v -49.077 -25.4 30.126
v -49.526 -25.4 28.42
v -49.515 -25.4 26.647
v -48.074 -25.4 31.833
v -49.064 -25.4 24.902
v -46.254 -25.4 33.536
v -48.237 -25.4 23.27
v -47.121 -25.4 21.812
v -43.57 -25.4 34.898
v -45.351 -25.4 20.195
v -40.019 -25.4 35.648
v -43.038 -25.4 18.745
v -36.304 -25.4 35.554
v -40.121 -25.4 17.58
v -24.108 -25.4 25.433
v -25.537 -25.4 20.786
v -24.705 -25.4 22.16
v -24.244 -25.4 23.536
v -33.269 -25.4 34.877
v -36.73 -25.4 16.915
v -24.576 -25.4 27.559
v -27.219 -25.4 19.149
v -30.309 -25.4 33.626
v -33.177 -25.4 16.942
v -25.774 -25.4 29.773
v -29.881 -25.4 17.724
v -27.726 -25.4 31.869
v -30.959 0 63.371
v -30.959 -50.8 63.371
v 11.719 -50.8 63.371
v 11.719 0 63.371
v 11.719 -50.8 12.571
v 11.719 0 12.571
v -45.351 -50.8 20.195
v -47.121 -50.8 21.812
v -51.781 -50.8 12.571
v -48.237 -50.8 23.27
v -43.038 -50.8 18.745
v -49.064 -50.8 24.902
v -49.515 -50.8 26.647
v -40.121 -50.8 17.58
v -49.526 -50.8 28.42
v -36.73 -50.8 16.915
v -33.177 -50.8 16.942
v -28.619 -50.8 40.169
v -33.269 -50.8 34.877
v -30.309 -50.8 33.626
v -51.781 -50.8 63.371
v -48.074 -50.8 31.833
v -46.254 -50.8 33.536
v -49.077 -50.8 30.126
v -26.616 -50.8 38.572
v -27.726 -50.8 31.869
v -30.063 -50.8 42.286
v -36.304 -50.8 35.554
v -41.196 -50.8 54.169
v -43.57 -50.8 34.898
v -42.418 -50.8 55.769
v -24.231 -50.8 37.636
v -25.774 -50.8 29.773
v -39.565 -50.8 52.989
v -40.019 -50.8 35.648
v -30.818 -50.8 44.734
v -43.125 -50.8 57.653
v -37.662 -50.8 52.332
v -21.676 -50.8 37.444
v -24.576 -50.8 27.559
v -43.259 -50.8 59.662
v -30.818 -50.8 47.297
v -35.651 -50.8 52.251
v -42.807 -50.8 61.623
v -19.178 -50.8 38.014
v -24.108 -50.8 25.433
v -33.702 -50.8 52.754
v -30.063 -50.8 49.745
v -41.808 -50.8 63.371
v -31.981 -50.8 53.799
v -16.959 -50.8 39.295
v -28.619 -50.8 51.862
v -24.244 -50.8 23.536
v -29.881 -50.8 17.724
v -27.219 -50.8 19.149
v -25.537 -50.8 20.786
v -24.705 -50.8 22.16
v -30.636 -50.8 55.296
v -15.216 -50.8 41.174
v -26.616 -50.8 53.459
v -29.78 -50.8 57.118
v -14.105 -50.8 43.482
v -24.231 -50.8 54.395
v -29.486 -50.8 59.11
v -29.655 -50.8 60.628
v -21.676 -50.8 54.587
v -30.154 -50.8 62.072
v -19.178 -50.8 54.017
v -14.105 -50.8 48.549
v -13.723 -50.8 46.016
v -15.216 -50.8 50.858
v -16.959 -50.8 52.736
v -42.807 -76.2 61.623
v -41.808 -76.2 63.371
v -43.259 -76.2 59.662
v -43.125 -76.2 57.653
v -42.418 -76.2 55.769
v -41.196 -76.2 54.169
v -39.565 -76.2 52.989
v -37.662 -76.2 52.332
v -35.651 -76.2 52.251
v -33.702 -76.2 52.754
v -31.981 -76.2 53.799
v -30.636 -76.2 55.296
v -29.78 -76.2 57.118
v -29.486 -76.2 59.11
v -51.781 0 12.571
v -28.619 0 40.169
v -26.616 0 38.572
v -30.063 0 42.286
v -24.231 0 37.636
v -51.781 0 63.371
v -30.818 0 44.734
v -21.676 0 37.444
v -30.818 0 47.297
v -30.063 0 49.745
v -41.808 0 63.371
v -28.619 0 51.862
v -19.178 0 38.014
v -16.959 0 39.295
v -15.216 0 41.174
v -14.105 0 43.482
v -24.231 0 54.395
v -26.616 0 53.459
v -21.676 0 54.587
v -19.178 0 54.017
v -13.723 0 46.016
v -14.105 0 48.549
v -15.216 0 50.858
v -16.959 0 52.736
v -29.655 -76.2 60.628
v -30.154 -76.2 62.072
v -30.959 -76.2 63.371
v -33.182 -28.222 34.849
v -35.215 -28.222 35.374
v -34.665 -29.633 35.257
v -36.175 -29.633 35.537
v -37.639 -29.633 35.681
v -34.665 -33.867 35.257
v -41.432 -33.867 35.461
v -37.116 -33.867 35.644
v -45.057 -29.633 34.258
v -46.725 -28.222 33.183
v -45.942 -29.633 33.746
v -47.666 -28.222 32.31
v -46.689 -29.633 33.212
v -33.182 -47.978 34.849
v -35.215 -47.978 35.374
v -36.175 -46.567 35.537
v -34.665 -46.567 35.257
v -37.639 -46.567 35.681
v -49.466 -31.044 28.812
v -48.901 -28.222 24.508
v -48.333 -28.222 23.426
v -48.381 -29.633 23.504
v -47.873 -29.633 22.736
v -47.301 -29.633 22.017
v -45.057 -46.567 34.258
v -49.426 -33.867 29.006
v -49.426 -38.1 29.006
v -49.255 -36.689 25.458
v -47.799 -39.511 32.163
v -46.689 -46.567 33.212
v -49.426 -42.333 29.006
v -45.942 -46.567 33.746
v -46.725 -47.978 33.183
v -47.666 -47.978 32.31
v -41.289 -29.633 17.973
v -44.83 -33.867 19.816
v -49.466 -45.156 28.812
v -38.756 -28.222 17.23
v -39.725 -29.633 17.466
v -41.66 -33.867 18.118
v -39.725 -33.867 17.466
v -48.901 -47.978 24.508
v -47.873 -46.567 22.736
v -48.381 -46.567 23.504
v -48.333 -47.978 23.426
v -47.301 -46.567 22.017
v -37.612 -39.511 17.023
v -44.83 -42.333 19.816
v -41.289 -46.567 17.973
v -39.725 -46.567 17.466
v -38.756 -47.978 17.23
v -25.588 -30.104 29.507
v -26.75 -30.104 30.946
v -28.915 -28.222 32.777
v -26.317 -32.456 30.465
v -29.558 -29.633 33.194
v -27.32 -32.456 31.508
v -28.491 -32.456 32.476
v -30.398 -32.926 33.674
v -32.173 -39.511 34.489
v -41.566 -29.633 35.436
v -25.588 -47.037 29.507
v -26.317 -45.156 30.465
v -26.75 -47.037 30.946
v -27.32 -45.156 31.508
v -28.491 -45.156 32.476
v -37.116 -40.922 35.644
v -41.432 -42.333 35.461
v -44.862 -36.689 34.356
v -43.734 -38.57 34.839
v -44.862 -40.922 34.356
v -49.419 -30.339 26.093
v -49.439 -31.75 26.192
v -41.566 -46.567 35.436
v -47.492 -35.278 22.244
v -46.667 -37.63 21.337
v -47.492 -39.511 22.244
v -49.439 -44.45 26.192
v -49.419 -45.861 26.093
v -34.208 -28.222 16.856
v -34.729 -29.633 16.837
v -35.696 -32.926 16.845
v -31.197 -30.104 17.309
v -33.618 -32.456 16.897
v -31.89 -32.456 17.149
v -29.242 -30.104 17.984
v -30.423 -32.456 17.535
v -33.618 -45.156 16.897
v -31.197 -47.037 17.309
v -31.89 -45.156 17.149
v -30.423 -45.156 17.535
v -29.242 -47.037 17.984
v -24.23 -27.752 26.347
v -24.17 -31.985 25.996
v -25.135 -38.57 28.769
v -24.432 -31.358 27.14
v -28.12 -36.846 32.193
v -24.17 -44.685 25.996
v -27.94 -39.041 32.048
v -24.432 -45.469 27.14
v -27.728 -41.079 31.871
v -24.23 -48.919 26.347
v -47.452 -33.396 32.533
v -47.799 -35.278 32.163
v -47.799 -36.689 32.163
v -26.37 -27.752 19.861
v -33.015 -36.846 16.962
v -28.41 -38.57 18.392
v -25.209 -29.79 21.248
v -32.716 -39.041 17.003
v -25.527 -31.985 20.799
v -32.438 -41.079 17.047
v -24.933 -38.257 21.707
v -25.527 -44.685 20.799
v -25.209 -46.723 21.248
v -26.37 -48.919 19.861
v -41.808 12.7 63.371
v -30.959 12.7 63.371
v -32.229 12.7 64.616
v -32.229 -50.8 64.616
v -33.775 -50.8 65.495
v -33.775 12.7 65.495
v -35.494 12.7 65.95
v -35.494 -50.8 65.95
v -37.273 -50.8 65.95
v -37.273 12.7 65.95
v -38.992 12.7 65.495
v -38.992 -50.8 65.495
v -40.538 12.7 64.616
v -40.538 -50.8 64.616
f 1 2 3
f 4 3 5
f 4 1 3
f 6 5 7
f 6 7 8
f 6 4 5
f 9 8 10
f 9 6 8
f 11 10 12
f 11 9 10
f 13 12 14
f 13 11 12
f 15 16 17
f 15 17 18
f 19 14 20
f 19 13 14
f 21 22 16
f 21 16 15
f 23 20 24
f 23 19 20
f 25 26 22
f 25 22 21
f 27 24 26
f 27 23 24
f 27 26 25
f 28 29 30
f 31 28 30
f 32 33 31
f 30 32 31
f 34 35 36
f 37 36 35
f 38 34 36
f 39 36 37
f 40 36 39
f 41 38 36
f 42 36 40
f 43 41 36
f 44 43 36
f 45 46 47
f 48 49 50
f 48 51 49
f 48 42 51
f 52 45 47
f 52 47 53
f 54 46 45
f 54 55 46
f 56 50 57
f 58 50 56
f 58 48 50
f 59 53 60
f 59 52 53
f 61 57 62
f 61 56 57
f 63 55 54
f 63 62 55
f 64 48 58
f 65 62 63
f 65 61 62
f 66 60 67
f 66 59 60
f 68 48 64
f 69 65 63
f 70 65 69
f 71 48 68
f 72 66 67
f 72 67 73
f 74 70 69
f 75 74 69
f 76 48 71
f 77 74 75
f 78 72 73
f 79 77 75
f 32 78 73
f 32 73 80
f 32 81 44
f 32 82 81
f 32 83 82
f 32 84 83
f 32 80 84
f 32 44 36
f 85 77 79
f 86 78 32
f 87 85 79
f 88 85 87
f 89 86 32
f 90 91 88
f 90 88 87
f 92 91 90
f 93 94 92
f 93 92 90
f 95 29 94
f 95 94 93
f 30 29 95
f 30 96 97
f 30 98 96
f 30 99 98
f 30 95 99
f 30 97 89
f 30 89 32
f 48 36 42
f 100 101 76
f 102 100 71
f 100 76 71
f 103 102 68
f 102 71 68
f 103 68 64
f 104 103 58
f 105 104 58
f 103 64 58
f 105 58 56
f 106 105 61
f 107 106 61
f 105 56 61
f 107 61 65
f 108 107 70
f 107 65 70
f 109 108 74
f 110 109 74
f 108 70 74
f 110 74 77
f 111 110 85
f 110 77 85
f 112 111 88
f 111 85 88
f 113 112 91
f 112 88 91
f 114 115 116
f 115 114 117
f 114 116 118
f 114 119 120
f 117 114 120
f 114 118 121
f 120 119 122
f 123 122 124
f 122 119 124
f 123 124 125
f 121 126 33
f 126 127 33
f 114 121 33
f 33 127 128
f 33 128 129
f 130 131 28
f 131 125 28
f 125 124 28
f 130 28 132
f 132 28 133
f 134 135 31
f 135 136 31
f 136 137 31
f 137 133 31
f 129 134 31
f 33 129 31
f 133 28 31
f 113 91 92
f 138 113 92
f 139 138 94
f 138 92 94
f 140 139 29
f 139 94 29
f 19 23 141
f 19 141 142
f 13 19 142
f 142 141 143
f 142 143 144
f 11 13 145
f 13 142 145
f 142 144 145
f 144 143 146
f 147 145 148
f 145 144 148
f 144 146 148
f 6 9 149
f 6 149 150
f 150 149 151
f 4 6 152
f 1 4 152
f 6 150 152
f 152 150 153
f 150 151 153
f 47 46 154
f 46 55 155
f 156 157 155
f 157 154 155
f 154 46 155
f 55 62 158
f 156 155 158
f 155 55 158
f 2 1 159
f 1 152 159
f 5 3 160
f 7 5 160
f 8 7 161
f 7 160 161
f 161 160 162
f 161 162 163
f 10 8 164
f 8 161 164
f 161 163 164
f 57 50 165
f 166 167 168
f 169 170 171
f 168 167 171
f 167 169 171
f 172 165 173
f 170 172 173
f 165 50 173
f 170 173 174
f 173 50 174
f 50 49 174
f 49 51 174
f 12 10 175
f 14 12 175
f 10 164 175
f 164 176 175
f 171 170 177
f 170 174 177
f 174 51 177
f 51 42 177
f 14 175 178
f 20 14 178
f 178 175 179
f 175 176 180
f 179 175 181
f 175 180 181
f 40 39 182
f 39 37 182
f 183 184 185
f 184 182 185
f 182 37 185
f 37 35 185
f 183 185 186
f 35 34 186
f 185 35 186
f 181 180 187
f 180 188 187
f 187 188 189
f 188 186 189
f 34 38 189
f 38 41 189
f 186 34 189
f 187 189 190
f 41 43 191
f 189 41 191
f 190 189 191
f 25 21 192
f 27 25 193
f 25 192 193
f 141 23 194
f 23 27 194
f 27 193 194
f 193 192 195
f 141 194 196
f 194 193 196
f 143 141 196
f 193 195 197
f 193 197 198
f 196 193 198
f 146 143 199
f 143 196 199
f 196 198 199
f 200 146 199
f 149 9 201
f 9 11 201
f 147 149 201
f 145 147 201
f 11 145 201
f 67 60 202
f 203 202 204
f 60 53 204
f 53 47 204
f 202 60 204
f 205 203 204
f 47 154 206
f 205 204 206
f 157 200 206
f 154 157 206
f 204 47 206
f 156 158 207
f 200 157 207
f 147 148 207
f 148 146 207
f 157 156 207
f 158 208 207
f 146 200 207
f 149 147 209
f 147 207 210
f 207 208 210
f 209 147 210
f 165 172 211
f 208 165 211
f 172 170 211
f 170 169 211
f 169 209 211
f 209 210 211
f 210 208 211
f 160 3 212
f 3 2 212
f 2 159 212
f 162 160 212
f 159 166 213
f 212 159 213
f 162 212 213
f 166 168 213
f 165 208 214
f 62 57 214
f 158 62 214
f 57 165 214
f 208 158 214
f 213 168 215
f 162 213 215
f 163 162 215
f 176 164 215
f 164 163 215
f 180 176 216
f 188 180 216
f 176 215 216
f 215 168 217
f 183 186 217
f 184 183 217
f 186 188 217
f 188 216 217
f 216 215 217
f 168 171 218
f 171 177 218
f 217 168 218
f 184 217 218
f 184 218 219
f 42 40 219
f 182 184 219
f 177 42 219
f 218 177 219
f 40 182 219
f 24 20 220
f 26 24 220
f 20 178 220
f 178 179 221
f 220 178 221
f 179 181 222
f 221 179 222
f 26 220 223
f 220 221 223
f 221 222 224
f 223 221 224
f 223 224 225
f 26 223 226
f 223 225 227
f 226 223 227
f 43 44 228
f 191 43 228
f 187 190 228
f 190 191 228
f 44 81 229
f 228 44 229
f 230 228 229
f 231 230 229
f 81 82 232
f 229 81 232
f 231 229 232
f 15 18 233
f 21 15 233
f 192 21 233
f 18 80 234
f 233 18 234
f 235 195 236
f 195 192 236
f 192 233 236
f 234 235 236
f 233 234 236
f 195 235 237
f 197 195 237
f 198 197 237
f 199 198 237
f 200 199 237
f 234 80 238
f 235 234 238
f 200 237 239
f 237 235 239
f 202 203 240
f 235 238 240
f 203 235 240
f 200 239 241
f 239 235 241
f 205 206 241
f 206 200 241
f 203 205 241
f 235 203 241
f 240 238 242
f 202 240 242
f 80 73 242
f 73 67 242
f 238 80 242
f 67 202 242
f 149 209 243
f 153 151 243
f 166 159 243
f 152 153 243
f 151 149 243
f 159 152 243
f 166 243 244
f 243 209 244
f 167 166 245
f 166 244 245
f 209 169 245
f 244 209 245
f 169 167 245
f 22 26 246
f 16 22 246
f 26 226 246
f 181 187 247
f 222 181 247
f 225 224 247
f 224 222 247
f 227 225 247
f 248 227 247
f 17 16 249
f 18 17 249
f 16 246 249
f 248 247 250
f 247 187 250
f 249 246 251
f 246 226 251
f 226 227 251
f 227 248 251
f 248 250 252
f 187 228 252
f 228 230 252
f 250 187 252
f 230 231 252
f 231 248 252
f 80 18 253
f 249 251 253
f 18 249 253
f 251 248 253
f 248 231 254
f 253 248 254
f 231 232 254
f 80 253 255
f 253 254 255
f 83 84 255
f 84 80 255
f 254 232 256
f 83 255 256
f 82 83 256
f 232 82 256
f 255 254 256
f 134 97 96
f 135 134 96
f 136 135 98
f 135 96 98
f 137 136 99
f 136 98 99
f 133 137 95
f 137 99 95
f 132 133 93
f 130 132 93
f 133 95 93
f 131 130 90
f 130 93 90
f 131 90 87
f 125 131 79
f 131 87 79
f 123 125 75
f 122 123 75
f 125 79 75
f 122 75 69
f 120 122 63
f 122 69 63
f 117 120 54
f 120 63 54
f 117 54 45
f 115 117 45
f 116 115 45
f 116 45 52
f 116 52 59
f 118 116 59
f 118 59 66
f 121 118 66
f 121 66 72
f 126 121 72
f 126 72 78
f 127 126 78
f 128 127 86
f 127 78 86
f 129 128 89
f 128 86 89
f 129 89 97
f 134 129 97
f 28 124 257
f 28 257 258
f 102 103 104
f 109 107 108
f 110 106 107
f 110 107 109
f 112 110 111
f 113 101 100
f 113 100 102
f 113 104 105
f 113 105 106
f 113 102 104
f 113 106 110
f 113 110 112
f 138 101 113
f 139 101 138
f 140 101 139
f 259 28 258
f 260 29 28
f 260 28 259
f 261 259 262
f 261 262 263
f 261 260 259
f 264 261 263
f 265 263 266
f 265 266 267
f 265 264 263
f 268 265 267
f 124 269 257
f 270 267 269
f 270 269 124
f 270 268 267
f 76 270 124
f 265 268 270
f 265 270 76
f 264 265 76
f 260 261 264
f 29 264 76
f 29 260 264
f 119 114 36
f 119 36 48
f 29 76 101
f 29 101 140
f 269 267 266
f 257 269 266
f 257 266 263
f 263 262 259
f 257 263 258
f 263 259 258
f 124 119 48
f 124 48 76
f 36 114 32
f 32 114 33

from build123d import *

# Parameters (mm, degrees)
F0_W     = 63.5
F0_H     = 50.8
F1_DEPTH = 50.8
F3_DEPTH = 25.4
F2_R     = 8.595476
F4_DEPTH = 50.8
F5_DEPTH = 25.4
F6_DEPTH = 63.5


with BuildPart() as f1:
    # F0 (on Front) → F1 (new body)
    with BuildSketch(Plane.XZ):
        with Locations((-20.03084, 37.970573)):
            Rectangle(F0_W, F0_H)
    extrude(amount=F1_DEPTH)

    # F2 (on face) → F3 (join)
    with BuildSketch(Plane.XZ.offset(50.8)):
        with BuildLine():
            ThreePointArc((-41.807558, 63.370573), (-38.637678, 52.590738), (-29.485771, 59.109601))
            ThreePointArc((-29.485771, 59.109601), (-29.86454, 61.363876), (-30.959248, 63.370573))
            Line((-30.959248, 63.370573), (-41.807558, 63.370573))
        make_face()
    extrude(amount=F3_DEPTH)

    # F2 (on face) → F4 (cut)
    with BuildSketch(Plane.XZ.offset(50.8)):
        with Locations((-22.318399, 46.015508)):
            Circle(F2_R)
    extrude(amount=-F4_DEPTH, mode=Mode.SUBTRACT)

    # F2 (on face) → F5 (cut)
    with BuildSketch(Plane.XZ.offset(50.8)):
        with BuildLine():
            add(Edge.make_bspline(
                [(-24.2441, 23.536226), (-20.845911, 39.181114), (-41.431697, 35.461002), (-62.017482, 31.740891), (-44.829885, 19.816114), (-27.642288, 7.891338), (-24.2441, 23.536226)],
                knots=[0, 0, 0, 2.094395, 2.094395, 4.18879, 4.18879, 6.283185, 6.283185, 6.283185], degree=2, weights=[1, 0.5, 1, 0.5, 1, 0.5, 1]))
        make_face()
    extrude(amount=-F5_DEPTH, mode=Mode.SUBTRACT)

    # F2 (on face) → F6 (join)
    with BuildSketch(Plane.XZ.offset(50.8)):
        with BuildLine():
            Line((-41.807558, 63.370573), (-30.959248, 63.370573))
            ThreePointArc((-30.959248, 63.370573), (-36.383403, 66.007234), (-41.807558, 63.370573))
        make_face()
    extrude(amount=-F6_DEPTH)


solid = f1.part
